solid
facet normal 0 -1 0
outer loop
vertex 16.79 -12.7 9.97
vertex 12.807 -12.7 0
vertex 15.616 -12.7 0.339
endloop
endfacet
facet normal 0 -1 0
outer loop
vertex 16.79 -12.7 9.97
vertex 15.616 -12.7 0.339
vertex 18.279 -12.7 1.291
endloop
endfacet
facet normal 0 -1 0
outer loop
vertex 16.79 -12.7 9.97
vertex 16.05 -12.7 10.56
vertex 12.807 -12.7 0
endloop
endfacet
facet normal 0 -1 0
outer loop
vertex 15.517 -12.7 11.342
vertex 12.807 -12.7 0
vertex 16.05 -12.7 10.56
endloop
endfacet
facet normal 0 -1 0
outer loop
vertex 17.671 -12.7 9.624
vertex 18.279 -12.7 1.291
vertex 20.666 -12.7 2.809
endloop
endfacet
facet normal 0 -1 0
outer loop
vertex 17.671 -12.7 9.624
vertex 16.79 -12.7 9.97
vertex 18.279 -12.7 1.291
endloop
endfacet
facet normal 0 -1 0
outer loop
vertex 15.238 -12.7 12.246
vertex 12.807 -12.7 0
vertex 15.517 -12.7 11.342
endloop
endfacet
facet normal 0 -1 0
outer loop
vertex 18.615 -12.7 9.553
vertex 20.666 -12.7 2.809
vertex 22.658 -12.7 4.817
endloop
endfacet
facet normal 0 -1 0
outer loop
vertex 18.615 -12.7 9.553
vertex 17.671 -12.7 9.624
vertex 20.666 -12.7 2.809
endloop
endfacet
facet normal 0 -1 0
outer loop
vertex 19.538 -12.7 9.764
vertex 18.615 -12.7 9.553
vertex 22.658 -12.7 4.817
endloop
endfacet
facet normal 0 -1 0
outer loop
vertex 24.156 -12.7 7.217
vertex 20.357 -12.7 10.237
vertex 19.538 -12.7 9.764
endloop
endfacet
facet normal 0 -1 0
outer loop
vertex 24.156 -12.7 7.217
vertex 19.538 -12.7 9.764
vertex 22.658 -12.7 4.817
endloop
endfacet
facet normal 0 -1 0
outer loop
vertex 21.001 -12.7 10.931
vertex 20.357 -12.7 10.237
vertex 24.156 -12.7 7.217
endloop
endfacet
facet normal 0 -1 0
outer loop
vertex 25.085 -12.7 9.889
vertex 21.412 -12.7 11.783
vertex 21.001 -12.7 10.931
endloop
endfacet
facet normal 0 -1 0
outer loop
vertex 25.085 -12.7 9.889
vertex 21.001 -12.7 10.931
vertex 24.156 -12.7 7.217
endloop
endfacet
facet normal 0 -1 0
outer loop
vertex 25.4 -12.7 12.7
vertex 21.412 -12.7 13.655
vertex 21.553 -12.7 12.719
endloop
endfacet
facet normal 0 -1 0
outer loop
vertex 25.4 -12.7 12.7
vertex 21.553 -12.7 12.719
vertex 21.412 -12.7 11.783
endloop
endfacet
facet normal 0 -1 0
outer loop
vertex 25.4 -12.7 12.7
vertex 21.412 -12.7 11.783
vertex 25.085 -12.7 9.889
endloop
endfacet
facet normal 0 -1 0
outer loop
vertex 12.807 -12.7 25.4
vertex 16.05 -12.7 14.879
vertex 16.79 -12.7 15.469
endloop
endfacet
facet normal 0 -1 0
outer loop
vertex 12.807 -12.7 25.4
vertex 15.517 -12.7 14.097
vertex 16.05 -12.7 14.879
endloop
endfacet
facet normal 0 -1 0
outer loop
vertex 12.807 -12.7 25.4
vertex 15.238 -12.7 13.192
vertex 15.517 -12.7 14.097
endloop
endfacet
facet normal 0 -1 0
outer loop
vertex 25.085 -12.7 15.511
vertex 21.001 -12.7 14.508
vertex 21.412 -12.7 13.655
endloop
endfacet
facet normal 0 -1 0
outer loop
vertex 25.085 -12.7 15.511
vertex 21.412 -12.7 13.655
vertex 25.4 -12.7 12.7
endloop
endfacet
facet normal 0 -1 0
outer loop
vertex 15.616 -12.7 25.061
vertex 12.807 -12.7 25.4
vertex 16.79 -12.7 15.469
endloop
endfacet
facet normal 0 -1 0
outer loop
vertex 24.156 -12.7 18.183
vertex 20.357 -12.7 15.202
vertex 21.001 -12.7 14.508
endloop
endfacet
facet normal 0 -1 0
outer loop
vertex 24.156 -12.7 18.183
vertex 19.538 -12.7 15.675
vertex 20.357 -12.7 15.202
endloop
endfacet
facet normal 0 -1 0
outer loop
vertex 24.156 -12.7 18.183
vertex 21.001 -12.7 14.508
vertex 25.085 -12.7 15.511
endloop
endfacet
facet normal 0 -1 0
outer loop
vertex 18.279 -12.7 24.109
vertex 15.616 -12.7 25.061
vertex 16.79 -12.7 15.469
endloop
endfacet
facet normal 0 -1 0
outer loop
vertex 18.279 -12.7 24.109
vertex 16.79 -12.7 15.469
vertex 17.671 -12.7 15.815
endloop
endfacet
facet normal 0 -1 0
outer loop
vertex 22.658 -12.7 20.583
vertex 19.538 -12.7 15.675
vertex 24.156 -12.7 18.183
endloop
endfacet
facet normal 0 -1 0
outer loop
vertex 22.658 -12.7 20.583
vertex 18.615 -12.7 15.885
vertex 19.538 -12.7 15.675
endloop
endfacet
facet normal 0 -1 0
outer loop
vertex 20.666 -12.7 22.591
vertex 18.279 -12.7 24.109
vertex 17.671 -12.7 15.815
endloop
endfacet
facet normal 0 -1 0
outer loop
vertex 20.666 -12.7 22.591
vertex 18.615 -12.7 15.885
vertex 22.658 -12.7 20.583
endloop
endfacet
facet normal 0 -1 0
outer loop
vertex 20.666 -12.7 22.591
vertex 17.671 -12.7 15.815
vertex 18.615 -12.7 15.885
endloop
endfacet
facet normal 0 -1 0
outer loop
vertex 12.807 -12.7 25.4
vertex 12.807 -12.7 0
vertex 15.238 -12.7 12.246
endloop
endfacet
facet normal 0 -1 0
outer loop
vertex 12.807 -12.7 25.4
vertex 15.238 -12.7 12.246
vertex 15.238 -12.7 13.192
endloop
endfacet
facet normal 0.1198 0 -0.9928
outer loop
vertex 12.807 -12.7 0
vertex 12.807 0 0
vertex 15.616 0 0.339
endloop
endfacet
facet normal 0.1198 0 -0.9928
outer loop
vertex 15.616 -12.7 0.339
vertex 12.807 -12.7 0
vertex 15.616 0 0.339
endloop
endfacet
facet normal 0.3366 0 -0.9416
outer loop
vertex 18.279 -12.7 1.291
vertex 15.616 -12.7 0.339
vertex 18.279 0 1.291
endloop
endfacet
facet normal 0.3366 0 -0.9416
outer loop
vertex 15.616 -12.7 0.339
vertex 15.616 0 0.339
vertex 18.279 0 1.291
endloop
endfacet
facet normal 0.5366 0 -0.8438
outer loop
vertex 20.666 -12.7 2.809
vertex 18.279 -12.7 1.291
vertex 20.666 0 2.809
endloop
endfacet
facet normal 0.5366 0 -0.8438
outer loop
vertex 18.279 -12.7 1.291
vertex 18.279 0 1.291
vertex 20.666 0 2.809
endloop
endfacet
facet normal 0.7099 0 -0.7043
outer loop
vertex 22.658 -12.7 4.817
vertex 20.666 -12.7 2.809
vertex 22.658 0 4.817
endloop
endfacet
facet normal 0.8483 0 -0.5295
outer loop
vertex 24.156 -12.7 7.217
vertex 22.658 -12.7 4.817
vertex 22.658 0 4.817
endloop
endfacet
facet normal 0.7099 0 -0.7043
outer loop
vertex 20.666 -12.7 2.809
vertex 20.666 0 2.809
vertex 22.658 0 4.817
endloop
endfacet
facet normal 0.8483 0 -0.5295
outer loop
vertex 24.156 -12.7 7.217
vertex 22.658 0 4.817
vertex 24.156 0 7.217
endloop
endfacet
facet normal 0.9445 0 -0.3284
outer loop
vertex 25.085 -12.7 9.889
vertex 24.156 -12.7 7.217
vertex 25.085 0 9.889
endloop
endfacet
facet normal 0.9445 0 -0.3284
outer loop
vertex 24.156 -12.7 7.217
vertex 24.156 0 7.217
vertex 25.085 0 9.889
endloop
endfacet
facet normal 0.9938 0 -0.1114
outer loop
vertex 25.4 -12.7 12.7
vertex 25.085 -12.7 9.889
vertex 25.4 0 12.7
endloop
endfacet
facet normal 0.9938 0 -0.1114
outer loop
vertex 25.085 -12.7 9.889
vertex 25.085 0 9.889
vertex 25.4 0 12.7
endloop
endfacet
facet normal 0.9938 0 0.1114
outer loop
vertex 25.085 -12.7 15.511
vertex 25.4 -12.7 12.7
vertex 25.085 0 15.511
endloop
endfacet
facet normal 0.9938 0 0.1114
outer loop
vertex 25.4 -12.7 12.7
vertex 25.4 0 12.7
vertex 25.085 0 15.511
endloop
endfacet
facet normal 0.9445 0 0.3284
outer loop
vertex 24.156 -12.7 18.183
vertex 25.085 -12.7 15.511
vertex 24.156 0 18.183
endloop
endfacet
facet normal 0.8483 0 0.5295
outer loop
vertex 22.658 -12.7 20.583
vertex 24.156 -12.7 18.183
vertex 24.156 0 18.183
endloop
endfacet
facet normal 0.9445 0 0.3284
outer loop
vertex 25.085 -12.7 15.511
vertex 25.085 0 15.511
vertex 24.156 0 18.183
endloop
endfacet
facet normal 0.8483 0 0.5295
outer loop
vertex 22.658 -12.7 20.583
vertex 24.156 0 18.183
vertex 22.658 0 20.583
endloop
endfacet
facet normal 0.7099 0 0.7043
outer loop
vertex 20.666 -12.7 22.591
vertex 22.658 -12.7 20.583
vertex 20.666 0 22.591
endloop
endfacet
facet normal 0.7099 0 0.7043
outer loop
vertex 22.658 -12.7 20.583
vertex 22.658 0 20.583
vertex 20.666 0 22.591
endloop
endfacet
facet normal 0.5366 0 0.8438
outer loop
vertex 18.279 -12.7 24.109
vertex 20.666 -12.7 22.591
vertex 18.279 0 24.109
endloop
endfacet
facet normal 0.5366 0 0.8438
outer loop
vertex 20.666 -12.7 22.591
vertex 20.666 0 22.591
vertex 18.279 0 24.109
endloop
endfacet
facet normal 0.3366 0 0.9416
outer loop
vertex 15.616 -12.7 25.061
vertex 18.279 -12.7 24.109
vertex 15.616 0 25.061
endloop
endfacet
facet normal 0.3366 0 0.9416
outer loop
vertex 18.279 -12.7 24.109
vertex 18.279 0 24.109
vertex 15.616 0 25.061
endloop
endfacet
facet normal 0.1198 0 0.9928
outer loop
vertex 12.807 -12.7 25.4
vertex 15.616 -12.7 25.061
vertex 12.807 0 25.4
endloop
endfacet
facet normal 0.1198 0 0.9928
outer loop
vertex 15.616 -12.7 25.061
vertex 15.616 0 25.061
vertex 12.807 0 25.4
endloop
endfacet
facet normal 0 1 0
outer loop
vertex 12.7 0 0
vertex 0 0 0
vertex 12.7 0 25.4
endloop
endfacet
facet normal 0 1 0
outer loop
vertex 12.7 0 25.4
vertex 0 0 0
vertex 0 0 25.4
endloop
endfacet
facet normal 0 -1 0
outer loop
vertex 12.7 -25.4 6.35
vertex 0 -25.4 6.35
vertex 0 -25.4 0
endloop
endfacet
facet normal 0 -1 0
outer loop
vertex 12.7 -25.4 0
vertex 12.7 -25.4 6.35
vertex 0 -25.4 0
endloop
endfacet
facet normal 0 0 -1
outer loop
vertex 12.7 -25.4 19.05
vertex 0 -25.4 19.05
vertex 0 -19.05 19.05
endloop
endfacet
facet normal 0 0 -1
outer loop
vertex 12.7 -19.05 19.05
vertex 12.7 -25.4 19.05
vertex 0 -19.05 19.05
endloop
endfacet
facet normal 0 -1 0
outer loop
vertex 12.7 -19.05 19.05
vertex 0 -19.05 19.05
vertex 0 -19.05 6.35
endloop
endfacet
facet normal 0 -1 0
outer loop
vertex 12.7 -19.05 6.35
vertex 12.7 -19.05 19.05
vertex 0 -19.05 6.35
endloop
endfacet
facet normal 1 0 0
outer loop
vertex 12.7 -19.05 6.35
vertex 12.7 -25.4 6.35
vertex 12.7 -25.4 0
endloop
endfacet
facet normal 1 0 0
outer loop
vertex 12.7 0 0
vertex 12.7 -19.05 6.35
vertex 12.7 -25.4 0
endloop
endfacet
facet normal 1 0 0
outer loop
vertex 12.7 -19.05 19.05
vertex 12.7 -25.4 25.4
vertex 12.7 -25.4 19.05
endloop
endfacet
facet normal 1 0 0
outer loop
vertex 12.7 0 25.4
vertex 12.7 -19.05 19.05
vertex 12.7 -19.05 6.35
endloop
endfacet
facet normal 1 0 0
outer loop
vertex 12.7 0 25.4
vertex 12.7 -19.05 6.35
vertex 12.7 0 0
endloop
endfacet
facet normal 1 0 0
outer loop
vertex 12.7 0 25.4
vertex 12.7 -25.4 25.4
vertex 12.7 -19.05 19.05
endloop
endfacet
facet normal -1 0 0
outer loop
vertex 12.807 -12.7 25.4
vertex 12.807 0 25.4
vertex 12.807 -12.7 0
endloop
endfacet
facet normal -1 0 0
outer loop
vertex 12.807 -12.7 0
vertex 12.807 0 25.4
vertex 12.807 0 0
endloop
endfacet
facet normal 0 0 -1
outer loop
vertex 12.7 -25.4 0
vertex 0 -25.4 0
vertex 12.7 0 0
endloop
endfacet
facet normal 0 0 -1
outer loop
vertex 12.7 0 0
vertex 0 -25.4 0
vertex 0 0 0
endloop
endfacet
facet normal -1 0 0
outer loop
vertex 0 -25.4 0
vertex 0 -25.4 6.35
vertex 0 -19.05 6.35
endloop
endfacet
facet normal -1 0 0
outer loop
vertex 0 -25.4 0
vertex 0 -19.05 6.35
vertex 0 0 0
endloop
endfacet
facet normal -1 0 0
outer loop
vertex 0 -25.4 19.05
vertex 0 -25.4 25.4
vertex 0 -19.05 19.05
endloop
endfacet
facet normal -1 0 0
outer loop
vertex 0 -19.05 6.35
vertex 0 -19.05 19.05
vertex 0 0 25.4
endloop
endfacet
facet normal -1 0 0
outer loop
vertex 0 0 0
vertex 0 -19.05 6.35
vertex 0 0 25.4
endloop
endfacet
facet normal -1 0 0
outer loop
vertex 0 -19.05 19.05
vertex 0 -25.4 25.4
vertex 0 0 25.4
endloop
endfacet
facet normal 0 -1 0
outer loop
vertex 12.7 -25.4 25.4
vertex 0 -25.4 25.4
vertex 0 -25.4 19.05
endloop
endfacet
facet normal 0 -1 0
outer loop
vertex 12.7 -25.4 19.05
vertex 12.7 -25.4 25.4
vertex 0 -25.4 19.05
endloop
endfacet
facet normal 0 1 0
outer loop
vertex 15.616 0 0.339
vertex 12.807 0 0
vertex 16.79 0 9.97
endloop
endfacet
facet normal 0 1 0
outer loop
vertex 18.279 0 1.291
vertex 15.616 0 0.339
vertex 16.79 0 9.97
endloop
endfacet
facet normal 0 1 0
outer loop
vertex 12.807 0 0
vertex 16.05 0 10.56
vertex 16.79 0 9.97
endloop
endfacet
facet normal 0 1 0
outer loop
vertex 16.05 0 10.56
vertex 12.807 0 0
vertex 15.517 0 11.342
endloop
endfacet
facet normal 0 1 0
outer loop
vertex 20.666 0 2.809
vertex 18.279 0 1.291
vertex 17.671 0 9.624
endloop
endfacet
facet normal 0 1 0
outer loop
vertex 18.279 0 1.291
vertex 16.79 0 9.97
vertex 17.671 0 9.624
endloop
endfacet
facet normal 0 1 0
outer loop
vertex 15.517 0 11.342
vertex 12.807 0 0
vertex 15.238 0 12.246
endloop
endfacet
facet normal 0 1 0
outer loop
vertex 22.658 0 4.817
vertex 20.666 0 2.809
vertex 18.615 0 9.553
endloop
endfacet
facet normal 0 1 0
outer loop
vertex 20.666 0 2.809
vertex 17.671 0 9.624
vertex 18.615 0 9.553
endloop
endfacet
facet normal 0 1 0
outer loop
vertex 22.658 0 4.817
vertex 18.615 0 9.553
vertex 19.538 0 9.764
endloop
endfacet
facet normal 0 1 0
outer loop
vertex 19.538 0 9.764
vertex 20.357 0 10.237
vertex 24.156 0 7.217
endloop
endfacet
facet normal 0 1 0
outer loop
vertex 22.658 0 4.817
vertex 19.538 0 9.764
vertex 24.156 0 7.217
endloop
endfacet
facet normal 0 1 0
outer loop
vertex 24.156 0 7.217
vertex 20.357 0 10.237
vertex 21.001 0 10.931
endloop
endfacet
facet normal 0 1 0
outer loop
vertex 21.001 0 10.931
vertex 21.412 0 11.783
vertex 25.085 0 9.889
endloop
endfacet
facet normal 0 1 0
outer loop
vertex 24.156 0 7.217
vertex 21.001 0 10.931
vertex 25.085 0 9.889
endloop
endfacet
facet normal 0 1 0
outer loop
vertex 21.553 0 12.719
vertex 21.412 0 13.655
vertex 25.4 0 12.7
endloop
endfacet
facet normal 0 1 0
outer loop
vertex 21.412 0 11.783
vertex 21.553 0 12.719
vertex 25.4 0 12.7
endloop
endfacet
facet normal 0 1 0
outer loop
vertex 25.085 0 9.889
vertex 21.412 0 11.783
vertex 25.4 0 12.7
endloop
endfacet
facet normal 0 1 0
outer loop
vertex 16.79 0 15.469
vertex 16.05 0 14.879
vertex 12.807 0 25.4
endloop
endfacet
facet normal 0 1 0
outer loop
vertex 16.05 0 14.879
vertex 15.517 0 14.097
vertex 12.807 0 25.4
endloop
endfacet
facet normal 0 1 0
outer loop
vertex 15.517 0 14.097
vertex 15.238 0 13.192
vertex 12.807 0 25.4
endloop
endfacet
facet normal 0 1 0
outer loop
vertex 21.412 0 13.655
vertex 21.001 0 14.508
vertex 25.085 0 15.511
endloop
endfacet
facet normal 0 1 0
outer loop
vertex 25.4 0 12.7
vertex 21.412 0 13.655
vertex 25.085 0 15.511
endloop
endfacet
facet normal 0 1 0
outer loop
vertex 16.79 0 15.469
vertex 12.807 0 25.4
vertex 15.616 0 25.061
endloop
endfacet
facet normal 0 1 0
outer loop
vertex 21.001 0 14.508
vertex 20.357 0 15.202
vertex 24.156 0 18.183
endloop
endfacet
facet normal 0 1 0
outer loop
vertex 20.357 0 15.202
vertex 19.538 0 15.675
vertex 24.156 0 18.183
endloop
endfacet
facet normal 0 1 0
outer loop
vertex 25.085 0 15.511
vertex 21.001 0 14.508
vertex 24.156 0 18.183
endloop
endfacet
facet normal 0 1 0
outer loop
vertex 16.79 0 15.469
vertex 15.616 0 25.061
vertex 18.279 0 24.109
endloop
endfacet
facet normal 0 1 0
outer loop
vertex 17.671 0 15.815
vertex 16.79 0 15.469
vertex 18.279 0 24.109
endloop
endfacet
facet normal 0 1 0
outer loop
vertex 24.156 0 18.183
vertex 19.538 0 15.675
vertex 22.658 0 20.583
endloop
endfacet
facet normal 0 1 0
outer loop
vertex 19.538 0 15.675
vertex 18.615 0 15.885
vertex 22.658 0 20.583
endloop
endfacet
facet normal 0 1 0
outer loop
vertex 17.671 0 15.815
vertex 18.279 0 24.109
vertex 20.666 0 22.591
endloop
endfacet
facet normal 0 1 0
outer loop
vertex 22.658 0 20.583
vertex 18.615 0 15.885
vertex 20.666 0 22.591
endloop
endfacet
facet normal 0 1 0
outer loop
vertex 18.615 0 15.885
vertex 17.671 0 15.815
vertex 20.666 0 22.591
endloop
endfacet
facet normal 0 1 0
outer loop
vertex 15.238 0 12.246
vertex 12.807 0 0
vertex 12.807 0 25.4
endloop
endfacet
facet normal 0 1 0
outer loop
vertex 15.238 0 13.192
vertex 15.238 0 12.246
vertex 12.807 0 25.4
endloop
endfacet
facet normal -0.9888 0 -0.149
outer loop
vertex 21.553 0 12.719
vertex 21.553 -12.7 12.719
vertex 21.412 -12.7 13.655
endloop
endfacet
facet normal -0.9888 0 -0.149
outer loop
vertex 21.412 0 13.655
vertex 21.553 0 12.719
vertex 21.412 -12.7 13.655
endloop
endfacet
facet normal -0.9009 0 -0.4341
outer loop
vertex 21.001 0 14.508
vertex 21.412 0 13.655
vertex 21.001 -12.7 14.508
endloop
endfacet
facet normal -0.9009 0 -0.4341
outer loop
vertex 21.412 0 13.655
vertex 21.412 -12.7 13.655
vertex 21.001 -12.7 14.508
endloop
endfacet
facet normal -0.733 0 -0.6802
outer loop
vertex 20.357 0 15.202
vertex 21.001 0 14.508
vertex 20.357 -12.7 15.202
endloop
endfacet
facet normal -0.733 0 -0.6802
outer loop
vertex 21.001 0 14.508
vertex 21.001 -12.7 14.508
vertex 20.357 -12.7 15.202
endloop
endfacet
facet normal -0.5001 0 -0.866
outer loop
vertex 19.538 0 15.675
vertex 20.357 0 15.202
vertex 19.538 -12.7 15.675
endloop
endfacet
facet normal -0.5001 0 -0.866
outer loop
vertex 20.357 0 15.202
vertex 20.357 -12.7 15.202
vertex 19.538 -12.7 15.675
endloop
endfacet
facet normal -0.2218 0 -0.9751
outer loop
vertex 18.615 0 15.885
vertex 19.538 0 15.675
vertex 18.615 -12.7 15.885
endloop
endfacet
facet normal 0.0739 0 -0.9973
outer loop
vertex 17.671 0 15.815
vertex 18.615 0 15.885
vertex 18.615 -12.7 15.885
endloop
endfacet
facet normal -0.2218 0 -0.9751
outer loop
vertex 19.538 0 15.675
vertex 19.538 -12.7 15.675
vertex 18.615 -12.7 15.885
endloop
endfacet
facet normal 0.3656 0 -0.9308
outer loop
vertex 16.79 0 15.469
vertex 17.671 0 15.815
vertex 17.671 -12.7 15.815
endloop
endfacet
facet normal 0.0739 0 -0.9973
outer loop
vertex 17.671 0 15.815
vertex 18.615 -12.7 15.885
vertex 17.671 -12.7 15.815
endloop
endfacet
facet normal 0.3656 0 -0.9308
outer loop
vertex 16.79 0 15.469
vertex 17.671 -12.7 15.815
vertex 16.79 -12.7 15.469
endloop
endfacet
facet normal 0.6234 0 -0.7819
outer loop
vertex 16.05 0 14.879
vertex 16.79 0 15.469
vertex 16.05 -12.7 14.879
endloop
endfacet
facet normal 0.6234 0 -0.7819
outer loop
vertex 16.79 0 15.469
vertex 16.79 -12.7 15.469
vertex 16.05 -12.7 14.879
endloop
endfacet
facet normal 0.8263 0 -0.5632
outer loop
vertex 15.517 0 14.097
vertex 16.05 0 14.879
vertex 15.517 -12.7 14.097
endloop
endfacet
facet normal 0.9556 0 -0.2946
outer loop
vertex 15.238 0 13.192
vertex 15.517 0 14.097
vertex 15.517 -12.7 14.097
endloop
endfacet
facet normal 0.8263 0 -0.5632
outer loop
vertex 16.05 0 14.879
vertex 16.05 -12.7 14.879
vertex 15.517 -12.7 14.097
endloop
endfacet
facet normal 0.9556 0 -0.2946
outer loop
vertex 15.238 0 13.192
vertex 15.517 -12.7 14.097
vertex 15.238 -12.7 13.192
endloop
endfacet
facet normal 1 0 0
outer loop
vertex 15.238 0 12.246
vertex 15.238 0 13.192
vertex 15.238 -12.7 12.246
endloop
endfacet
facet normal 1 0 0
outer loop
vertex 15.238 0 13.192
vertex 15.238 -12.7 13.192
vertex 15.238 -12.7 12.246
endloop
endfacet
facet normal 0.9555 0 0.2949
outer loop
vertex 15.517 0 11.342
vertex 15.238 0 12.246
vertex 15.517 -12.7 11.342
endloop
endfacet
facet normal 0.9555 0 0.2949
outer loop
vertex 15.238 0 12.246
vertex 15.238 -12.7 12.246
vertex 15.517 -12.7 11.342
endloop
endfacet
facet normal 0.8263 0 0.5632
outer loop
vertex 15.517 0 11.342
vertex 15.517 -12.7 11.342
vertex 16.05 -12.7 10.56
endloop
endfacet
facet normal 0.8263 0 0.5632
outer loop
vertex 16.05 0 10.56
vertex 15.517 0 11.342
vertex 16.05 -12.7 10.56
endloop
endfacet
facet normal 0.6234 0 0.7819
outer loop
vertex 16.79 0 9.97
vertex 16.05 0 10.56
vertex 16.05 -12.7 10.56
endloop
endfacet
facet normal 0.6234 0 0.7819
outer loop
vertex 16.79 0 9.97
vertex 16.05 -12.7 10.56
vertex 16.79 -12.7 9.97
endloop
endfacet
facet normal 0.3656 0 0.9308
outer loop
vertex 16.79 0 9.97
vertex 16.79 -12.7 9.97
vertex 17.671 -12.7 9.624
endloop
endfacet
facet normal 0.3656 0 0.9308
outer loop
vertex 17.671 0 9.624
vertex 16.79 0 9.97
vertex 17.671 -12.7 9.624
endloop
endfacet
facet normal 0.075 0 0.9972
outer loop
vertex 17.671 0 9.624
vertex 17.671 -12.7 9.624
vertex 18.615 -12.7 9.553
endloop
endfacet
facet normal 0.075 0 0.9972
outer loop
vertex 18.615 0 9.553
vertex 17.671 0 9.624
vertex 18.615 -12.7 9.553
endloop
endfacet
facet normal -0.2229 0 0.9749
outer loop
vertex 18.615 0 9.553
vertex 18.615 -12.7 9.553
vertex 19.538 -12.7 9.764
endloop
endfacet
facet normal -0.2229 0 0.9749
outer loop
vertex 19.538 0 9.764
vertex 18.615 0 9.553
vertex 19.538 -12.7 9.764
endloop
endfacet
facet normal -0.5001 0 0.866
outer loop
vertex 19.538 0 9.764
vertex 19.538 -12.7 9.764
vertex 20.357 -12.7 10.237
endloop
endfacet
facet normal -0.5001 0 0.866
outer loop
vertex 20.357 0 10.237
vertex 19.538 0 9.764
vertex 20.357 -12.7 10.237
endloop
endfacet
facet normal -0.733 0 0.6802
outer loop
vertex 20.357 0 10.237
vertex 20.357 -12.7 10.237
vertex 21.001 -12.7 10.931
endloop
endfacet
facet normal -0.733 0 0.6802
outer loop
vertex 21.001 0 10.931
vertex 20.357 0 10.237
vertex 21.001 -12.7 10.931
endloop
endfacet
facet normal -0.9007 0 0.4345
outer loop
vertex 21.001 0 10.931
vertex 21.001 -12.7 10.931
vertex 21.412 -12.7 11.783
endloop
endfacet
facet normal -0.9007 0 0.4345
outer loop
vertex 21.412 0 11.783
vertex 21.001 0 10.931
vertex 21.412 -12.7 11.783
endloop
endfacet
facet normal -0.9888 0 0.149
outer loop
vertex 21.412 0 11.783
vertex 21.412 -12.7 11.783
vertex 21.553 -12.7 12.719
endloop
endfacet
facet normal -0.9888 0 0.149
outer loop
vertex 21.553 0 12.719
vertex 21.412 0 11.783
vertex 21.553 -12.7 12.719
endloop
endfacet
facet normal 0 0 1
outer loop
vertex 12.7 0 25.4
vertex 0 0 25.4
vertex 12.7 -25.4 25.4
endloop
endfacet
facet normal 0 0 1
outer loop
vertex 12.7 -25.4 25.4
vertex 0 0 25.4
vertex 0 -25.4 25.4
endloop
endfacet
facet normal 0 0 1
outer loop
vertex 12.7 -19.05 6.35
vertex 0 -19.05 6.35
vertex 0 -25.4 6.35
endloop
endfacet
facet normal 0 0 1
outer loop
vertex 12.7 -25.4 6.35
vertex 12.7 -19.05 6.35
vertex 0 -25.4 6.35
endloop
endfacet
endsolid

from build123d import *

# Parameters (mm, degrees)
F1_DEPTH = 12.7
F3_DEPTH = 12.7
F4_R     = 3.175
F5_DEPTH = 12.701


with BuildPart() as f1:
    # F0 (on Right) → F1 (new body)
    with BuildSketch(Plane.YZ):
        Polygon((-25.4, 0), (0, 0), (0, 25.4), (-25.4, 25.4), (-25.4, 19.05), (-19.05, 19.05), (-19.05, 6.35), (-25.4, 6.35), align=None)
    extrude(amount=F1_DEPTH)


with BuildPart() as f3:
    # F2 (on Front) → F3 (new body)
    with BuildSketch(Plane.XZ):
        with BuildLine():
            Line((12.807242, 25.4), (12.807242, 0))
            ThreePointArc((12.807242, 0), (25.400453, 12.7), (12.807242, 25.4))
        make_face()
    extrude(amount=F3_DEPTH)

    # F4 (on face) → F5 (cut, through all)
    with BuildSketch(Plane.XZ.offset(12.7)):
        with Locations((18.377574, 12.719289)):
            Circle(F4_R)
    extrude(amount=-F5_DEPTH, mode=Mode.SUBTRACT)


solid = Compound([f1.part, f3.part])
